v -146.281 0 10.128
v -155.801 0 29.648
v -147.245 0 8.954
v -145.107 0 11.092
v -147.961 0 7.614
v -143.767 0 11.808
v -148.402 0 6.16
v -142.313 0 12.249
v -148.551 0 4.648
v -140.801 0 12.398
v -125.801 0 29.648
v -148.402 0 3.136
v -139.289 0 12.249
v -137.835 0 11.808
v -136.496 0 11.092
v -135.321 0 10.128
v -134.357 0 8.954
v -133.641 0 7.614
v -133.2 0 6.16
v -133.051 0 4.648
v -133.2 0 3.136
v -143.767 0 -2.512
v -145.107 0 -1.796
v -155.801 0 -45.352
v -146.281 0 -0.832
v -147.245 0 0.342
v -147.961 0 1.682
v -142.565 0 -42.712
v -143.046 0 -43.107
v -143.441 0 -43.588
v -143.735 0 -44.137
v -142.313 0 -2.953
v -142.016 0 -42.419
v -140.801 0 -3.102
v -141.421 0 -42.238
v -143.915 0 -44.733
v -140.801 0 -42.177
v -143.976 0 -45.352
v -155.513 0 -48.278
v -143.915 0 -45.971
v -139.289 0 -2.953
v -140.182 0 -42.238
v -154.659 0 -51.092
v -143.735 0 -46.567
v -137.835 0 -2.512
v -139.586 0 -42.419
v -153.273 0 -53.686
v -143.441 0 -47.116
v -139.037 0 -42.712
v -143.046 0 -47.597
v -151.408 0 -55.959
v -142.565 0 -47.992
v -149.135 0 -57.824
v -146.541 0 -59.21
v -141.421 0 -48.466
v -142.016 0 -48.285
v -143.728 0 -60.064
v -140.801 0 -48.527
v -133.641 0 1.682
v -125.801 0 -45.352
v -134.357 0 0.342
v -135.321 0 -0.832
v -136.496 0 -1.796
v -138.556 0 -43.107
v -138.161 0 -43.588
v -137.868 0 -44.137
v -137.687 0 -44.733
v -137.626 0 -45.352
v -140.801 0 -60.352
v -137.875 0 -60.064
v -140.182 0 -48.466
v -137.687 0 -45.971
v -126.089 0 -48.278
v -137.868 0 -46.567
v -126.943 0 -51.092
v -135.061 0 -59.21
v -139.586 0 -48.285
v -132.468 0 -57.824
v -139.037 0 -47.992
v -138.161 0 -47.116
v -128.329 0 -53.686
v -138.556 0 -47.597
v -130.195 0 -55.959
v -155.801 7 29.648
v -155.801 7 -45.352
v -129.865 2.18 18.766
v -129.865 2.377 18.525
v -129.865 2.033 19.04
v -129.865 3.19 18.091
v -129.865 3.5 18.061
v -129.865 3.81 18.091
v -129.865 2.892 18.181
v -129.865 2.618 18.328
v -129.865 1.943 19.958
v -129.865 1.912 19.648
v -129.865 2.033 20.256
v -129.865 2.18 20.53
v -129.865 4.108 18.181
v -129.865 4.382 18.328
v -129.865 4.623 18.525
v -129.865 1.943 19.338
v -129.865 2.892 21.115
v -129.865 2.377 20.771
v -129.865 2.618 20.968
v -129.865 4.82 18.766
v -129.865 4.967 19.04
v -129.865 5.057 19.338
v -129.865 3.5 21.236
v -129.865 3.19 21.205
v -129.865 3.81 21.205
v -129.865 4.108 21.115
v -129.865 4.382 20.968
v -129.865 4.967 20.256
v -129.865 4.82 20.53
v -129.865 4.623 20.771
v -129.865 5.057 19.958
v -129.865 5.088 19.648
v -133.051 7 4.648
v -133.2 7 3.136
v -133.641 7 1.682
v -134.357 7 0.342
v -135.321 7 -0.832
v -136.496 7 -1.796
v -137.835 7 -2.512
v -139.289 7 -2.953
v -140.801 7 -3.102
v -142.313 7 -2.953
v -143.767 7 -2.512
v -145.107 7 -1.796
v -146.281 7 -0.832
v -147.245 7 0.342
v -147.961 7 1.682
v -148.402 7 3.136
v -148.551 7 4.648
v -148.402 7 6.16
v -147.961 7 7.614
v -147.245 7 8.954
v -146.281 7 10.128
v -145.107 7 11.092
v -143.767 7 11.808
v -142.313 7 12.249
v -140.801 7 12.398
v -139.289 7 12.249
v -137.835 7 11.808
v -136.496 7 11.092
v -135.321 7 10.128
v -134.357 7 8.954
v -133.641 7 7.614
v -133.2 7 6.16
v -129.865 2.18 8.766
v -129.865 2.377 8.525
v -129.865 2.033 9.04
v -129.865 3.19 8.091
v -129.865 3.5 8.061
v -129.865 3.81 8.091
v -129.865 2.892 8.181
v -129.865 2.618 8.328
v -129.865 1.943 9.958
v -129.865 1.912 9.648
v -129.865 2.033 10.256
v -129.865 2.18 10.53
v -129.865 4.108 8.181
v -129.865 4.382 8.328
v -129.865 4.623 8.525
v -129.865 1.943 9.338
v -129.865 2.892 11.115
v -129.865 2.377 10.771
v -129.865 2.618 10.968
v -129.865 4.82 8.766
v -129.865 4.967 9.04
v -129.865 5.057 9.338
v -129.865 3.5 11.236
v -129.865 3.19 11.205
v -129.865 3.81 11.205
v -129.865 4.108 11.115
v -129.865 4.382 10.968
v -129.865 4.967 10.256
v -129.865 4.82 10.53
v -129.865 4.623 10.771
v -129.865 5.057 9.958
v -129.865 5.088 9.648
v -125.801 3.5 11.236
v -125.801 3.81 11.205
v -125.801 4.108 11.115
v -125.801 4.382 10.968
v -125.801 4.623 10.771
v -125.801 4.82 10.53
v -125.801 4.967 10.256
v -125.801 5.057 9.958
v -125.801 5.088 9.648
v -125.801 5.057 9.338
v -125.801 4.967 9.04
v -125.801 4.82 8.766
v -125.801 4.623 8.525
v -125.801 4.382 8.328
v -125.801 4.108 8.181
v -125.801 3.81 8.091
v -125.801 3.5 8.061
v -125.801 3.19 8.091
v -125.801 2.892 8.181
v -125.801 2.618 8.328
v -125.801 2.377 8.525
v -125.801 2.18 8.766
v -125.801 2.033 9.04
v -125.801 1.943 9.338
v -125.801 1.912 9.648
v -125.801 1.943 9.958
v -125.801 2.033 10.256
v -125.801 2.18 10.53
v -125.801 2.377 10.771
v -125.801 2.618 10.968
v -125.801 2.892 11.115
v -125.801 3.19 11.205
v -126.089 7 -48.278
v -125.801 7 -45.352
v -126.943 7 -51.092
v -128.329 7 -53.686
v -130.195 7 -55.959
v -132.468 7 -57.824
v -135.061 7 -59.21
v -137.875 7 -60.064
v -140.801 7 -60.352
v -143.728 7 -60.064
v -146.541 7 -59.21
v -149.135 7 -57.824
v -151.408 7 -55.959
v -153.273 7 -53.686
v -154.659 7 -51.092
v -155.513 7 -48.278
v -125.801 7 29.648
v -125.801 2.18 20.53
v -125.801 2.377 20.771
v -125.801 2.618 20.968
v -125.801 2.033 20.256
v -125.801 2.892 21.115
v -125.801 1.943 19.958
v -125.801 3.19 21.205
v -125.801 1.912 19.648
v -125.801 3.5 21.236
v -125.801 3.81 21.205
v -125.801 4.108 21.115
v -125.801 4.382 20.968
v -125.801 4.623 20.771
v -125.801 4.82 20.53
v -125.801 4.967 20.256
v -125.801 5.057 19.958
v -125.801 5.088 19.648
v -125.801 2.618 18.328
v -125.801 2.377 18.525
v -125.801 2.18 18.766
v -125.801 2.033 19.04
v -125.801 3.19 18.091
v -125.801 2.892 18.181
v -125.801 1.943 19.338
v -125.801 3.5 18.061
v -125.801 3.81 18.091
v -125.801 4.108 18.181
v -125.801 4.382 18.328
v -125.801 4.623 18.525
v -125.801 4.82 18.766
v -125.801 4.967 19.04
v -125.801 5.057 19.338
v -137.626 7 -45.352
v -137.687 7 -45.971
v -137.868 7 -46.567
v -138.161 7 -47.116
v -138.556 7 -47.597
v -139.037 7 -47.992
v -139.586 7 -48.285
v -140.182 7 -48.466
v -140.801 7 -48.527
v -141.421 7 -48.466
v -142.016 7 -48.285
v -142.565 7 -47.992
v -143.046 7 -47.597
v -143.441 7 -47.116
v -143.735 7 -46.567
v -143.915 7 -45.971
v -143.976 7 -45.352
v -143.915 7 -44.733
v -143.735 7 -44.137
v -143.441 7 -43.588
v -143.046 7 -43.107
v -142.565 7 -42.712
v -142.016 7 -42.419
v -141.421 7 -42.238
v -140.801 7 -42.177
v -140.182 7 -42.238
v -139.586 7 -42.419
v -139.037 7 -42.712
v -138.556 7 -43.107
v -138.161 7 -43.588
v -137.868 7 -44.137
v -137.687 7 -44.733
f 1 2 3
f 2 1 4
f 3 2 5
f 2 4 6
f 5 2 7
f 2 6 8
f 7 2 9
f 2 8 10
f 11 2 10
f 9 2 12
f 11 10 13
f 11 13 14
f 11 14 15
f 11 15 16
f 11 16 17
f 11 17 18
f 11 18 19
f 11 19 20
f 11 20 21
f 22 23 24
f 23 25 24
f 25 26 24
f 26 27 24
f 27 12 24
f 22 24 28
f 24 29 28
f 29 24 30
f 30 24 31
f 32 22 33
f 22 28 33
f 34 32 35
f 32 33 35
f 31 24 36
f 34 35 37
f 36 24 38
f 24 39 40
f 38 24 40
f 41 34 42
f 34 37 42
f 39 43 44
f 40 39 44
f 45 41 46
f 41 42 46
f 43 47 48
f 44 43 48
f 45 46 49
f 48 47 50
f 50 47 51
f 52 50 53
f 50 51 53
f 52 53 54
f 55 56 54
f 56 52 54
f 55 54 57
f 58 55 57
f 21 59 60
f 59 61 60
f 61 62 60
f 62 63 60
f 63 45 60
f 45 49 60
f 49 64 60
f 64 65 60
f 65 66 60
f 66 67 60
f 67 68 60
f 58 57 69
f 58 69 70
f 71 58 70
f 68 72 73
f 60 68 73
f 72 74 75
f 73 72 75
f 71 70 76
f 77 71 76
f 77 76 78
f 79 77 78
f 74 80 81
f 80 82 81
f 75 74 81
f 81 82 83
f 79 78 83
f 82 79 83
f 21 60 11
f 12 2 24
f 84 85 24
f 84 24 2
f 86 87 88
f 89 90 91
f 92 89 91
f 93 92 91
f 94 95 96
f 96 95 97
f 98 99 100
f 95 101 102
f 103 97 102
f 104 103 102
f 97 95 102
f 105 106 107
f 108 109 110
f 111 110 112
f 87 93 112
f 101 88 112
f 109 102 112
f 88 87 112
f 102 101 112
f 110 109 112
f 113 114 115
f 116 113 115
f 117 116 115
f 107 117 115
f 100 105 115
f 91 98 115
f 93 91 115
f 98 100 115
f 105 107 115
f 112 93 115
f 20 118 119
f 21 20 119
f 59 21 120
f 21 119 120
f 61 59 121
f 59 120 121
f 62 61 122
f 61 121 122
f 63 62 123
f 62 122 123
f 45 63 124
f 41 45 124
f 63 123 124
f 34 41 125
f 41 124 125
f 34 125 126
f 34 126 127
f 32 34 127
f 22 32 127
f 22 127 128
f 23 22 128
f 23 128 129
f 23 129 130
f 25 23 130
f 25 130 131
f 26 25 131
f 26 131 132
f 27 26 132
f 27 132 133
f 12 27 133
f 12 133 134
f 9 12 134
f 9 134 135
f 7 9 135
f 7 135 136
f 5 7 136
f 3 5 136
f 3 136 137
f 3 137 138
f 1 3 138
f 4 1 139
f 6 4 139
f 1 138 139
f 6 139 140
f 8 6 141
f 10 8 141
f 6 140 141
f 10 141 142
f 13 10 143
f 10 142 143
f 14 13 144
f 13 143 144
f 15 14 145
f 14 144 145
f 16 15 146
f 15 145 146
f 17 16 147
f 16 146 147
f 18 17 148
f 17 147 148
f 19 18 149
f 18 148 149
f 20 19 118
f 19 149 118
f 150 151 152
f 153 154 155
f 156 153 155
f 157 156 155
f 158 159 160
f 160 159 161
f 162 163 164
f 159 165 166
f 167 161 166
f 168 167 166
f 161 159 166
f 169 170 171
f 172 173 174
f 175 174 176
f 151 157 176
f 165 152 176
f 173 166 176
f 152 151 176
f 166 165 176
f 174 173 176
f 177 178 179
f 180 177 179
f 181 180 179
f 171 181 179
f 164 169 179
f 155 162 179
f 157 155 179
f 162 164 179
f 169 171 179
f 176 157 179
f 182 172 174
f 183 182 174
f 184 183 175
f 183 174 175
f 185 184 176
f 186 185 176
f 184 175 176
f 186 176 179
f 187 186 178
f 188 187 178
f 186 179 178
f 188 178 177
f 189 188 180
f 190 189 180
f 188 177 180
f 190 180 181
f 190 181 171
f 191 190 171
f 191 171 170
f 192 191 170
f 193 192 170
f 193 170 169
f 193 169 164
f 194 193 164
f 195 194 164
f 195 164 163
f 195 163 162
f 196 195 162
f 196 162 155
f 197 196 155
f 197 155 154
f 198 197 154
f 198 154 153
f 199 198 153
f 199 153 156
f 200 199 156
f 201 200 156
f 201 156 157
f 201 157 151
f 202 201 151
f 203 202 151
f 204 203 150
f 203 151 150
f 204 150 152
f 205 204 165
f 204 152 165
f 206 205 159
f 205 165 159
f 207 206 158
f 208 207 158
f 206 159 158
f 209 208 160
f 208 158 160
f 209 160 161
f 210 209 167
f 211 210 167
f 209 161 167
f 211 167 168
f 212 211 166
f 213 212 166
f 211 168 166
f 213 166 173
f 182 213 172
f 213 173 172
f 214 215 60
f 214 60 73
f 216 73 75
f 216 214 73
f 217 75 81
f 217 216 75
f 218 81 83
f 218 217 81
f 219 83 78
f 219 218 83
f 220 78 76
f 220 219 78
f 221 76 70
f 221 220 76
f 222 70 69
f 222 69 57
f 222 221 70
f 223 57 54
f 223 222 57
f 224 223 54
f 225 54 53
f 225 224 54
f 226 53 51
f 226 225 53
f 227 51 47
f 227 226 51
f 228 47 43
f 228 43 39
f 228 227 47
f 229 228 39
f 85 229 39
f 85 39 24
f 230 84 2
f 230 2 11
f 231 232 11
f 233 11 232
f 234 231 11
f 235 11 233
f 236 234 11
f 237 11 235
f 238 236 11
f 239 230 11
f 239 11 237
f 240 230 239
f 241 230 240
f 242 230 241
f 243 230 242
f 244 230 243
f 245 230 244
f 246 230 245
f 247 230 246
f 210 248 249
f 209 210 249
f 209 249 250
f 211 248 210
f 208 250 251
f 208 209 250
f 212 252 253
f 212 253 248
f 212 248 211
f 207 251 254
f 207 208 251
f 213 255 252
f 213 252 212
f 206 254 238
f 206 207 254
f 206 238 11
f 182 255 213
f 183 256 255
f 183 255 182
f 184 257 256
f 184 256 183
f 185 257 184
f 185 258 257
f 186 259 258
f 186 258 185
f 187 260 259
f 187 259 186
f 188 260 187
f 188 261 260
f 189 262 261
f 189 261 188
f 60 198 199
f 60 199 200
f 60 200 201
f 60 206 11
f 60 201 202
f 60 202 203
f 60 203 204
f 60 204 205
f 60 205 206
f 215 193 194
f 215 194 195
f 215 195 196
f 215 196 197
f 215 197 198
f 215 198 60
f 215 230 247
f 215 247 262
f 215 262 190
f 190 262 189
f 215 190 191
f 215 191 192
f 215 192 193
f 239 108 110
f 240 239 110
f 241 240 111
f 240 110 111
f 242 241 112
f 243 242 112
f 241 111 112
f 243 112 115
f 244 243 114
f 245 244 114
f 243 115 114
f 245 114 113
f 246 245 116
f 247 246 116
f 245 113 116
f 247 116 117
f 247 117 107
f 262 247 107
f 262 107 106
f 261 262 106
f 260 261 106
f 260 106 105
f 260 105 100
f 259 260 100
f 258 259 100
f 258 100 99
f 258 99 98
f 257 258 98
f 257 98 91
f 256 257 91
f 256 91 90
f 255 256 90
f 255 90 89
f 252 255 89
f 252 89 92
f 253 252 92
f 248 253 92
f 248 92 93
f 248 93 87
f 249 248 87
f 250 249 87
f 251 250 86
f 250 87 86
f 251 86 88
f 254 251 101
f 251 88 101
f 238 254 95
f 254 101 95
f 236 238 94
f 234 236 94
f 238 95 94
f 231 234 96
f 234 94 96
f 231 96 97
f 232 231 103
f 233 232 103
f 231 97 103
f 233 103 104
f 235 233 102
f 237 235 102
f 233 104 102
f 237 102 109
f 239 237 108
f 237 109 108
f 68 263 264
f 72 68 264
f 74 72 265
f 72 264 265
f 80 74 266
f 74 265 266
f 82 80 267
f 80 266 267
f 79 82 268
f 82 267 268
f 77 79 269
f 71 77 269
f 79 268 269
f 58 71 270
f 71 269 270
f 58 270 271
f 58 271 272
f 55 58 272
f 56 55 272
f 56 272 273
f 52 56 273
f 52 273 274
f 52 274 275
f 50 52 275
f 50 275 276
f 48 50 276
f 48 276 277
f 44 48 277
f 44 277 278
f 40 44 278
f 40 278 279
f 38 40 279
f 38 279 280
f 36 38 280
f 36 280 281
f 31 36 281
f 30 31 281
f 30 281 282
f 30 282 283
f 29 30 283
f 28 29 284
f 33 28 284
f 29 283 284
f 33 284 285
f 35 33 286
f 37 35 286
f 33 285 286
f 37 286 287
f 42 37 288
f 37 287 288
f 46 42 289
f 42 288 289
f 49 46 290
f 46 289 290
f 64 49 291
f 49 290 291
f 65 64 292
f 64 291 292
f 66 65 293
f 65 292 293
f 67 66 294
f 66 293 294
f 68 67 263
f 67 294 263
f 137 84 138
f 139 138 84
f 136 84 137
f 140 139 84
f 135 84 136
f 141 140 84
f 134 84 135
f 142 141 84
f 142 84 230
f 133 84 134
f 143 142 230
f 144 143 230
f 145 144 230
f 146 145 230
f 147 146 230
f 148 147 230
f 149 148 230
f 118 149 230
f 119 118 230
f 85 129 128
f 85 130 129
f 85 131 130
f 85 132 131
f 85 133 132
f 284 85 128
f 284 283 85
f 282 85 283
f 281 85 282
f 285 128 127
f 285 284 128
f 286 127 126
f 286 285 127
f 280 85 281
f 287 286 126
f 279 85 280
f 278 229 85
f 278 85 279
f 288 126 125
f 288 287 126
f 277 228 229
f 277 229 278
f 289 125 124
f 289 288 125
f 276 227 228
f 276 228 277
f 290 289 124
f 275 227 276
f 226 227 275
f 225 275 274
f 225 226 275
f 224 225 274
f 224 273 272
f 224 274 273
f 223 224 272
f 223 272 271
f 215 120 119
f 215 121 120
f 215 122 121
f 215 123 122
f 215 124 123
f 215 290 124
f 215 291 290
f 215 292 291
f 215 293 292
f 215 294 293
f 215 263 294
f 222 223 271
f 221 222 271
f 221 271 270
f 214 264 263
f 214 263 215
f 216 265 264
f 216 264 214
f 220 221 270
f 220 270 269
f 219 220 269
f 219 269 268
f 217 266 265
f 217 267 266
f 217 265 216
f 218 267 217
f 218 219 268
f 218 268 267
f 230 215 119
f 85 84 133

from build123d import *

# Parameters (mm, degrees)
BOSS_EXTRUDE1_DEPTH              = 7
F_1_8_0_125_DIAMETER_HOLE1_D     = 3.175
F_1_8_0_125_DIAMETER_HOLE1_DEPTH = 4.064
HOLE1_D                          = 15.5
F_1_4_0_25_DIAMETER_HOLE1_D      = 6.35


with BuildPart() as part:
    # Sketch1 → Boss-Extrude1 (new body)
    with BuildSketch(Plane(origin=(0, 7, 0), x_dir=(1, 0, 0), z_dir=(0, 1, 0))):
        with BuildLine():
            Line((-125.801197545, -29.648007087), (-125.801197545, 45.351992913))
            ThreePointArc((-125.801197545, 45.351992913), (-140.801197545, 60.351992913), (-155.801197545, 45.351992913))
            Line((-155.801197545, 45.351992913), (-155.801197545, -29.648007087))
            Line((-155.801197545, -29.648007087), (-125.801197545, -29.648007087))
        make_face()
    extrude(amount=-BOSS_EXTRUDE1_DEPTH)

    # 1/8 (0.125) Diameter Hole1
    with Locations(Plane(origin=(-125.801197545, 0, 0), x_dir=(0, 0, -1), z_dir=(1, 0, 0))):
        with Locations((-19.648007087, 3.5), (-9.648007087, 3.5)):
            Hole(F_1_8_0_125_DIAMETER_HOLE1_D / 2, depth=F_1_8_0_125_DIAMETER_HOLE1_DEPTH)

    # Hole1 (through all)
    with Locations(Plane(origin=(0, 0, 0), x_dir=(-1, 0, 0), z_dir=(0, -1, 0))):
        with Locations((140.801197545, -4.648007087)):
            Hole(HOLE1_D / 2)

    # 1/4 (0.25) Diameter Hole1 (through all)
    with Locations(Plane(origin=(0, 0, 0), x_dir=(-1, 0, 0), z_dir=(0, -1, 0))):
        with Locations((140.801197545, 45.351992913)):
            Hole(F_1_4_0_25_DIAMETER_HOLE1_D / 2)


solid = part.part
